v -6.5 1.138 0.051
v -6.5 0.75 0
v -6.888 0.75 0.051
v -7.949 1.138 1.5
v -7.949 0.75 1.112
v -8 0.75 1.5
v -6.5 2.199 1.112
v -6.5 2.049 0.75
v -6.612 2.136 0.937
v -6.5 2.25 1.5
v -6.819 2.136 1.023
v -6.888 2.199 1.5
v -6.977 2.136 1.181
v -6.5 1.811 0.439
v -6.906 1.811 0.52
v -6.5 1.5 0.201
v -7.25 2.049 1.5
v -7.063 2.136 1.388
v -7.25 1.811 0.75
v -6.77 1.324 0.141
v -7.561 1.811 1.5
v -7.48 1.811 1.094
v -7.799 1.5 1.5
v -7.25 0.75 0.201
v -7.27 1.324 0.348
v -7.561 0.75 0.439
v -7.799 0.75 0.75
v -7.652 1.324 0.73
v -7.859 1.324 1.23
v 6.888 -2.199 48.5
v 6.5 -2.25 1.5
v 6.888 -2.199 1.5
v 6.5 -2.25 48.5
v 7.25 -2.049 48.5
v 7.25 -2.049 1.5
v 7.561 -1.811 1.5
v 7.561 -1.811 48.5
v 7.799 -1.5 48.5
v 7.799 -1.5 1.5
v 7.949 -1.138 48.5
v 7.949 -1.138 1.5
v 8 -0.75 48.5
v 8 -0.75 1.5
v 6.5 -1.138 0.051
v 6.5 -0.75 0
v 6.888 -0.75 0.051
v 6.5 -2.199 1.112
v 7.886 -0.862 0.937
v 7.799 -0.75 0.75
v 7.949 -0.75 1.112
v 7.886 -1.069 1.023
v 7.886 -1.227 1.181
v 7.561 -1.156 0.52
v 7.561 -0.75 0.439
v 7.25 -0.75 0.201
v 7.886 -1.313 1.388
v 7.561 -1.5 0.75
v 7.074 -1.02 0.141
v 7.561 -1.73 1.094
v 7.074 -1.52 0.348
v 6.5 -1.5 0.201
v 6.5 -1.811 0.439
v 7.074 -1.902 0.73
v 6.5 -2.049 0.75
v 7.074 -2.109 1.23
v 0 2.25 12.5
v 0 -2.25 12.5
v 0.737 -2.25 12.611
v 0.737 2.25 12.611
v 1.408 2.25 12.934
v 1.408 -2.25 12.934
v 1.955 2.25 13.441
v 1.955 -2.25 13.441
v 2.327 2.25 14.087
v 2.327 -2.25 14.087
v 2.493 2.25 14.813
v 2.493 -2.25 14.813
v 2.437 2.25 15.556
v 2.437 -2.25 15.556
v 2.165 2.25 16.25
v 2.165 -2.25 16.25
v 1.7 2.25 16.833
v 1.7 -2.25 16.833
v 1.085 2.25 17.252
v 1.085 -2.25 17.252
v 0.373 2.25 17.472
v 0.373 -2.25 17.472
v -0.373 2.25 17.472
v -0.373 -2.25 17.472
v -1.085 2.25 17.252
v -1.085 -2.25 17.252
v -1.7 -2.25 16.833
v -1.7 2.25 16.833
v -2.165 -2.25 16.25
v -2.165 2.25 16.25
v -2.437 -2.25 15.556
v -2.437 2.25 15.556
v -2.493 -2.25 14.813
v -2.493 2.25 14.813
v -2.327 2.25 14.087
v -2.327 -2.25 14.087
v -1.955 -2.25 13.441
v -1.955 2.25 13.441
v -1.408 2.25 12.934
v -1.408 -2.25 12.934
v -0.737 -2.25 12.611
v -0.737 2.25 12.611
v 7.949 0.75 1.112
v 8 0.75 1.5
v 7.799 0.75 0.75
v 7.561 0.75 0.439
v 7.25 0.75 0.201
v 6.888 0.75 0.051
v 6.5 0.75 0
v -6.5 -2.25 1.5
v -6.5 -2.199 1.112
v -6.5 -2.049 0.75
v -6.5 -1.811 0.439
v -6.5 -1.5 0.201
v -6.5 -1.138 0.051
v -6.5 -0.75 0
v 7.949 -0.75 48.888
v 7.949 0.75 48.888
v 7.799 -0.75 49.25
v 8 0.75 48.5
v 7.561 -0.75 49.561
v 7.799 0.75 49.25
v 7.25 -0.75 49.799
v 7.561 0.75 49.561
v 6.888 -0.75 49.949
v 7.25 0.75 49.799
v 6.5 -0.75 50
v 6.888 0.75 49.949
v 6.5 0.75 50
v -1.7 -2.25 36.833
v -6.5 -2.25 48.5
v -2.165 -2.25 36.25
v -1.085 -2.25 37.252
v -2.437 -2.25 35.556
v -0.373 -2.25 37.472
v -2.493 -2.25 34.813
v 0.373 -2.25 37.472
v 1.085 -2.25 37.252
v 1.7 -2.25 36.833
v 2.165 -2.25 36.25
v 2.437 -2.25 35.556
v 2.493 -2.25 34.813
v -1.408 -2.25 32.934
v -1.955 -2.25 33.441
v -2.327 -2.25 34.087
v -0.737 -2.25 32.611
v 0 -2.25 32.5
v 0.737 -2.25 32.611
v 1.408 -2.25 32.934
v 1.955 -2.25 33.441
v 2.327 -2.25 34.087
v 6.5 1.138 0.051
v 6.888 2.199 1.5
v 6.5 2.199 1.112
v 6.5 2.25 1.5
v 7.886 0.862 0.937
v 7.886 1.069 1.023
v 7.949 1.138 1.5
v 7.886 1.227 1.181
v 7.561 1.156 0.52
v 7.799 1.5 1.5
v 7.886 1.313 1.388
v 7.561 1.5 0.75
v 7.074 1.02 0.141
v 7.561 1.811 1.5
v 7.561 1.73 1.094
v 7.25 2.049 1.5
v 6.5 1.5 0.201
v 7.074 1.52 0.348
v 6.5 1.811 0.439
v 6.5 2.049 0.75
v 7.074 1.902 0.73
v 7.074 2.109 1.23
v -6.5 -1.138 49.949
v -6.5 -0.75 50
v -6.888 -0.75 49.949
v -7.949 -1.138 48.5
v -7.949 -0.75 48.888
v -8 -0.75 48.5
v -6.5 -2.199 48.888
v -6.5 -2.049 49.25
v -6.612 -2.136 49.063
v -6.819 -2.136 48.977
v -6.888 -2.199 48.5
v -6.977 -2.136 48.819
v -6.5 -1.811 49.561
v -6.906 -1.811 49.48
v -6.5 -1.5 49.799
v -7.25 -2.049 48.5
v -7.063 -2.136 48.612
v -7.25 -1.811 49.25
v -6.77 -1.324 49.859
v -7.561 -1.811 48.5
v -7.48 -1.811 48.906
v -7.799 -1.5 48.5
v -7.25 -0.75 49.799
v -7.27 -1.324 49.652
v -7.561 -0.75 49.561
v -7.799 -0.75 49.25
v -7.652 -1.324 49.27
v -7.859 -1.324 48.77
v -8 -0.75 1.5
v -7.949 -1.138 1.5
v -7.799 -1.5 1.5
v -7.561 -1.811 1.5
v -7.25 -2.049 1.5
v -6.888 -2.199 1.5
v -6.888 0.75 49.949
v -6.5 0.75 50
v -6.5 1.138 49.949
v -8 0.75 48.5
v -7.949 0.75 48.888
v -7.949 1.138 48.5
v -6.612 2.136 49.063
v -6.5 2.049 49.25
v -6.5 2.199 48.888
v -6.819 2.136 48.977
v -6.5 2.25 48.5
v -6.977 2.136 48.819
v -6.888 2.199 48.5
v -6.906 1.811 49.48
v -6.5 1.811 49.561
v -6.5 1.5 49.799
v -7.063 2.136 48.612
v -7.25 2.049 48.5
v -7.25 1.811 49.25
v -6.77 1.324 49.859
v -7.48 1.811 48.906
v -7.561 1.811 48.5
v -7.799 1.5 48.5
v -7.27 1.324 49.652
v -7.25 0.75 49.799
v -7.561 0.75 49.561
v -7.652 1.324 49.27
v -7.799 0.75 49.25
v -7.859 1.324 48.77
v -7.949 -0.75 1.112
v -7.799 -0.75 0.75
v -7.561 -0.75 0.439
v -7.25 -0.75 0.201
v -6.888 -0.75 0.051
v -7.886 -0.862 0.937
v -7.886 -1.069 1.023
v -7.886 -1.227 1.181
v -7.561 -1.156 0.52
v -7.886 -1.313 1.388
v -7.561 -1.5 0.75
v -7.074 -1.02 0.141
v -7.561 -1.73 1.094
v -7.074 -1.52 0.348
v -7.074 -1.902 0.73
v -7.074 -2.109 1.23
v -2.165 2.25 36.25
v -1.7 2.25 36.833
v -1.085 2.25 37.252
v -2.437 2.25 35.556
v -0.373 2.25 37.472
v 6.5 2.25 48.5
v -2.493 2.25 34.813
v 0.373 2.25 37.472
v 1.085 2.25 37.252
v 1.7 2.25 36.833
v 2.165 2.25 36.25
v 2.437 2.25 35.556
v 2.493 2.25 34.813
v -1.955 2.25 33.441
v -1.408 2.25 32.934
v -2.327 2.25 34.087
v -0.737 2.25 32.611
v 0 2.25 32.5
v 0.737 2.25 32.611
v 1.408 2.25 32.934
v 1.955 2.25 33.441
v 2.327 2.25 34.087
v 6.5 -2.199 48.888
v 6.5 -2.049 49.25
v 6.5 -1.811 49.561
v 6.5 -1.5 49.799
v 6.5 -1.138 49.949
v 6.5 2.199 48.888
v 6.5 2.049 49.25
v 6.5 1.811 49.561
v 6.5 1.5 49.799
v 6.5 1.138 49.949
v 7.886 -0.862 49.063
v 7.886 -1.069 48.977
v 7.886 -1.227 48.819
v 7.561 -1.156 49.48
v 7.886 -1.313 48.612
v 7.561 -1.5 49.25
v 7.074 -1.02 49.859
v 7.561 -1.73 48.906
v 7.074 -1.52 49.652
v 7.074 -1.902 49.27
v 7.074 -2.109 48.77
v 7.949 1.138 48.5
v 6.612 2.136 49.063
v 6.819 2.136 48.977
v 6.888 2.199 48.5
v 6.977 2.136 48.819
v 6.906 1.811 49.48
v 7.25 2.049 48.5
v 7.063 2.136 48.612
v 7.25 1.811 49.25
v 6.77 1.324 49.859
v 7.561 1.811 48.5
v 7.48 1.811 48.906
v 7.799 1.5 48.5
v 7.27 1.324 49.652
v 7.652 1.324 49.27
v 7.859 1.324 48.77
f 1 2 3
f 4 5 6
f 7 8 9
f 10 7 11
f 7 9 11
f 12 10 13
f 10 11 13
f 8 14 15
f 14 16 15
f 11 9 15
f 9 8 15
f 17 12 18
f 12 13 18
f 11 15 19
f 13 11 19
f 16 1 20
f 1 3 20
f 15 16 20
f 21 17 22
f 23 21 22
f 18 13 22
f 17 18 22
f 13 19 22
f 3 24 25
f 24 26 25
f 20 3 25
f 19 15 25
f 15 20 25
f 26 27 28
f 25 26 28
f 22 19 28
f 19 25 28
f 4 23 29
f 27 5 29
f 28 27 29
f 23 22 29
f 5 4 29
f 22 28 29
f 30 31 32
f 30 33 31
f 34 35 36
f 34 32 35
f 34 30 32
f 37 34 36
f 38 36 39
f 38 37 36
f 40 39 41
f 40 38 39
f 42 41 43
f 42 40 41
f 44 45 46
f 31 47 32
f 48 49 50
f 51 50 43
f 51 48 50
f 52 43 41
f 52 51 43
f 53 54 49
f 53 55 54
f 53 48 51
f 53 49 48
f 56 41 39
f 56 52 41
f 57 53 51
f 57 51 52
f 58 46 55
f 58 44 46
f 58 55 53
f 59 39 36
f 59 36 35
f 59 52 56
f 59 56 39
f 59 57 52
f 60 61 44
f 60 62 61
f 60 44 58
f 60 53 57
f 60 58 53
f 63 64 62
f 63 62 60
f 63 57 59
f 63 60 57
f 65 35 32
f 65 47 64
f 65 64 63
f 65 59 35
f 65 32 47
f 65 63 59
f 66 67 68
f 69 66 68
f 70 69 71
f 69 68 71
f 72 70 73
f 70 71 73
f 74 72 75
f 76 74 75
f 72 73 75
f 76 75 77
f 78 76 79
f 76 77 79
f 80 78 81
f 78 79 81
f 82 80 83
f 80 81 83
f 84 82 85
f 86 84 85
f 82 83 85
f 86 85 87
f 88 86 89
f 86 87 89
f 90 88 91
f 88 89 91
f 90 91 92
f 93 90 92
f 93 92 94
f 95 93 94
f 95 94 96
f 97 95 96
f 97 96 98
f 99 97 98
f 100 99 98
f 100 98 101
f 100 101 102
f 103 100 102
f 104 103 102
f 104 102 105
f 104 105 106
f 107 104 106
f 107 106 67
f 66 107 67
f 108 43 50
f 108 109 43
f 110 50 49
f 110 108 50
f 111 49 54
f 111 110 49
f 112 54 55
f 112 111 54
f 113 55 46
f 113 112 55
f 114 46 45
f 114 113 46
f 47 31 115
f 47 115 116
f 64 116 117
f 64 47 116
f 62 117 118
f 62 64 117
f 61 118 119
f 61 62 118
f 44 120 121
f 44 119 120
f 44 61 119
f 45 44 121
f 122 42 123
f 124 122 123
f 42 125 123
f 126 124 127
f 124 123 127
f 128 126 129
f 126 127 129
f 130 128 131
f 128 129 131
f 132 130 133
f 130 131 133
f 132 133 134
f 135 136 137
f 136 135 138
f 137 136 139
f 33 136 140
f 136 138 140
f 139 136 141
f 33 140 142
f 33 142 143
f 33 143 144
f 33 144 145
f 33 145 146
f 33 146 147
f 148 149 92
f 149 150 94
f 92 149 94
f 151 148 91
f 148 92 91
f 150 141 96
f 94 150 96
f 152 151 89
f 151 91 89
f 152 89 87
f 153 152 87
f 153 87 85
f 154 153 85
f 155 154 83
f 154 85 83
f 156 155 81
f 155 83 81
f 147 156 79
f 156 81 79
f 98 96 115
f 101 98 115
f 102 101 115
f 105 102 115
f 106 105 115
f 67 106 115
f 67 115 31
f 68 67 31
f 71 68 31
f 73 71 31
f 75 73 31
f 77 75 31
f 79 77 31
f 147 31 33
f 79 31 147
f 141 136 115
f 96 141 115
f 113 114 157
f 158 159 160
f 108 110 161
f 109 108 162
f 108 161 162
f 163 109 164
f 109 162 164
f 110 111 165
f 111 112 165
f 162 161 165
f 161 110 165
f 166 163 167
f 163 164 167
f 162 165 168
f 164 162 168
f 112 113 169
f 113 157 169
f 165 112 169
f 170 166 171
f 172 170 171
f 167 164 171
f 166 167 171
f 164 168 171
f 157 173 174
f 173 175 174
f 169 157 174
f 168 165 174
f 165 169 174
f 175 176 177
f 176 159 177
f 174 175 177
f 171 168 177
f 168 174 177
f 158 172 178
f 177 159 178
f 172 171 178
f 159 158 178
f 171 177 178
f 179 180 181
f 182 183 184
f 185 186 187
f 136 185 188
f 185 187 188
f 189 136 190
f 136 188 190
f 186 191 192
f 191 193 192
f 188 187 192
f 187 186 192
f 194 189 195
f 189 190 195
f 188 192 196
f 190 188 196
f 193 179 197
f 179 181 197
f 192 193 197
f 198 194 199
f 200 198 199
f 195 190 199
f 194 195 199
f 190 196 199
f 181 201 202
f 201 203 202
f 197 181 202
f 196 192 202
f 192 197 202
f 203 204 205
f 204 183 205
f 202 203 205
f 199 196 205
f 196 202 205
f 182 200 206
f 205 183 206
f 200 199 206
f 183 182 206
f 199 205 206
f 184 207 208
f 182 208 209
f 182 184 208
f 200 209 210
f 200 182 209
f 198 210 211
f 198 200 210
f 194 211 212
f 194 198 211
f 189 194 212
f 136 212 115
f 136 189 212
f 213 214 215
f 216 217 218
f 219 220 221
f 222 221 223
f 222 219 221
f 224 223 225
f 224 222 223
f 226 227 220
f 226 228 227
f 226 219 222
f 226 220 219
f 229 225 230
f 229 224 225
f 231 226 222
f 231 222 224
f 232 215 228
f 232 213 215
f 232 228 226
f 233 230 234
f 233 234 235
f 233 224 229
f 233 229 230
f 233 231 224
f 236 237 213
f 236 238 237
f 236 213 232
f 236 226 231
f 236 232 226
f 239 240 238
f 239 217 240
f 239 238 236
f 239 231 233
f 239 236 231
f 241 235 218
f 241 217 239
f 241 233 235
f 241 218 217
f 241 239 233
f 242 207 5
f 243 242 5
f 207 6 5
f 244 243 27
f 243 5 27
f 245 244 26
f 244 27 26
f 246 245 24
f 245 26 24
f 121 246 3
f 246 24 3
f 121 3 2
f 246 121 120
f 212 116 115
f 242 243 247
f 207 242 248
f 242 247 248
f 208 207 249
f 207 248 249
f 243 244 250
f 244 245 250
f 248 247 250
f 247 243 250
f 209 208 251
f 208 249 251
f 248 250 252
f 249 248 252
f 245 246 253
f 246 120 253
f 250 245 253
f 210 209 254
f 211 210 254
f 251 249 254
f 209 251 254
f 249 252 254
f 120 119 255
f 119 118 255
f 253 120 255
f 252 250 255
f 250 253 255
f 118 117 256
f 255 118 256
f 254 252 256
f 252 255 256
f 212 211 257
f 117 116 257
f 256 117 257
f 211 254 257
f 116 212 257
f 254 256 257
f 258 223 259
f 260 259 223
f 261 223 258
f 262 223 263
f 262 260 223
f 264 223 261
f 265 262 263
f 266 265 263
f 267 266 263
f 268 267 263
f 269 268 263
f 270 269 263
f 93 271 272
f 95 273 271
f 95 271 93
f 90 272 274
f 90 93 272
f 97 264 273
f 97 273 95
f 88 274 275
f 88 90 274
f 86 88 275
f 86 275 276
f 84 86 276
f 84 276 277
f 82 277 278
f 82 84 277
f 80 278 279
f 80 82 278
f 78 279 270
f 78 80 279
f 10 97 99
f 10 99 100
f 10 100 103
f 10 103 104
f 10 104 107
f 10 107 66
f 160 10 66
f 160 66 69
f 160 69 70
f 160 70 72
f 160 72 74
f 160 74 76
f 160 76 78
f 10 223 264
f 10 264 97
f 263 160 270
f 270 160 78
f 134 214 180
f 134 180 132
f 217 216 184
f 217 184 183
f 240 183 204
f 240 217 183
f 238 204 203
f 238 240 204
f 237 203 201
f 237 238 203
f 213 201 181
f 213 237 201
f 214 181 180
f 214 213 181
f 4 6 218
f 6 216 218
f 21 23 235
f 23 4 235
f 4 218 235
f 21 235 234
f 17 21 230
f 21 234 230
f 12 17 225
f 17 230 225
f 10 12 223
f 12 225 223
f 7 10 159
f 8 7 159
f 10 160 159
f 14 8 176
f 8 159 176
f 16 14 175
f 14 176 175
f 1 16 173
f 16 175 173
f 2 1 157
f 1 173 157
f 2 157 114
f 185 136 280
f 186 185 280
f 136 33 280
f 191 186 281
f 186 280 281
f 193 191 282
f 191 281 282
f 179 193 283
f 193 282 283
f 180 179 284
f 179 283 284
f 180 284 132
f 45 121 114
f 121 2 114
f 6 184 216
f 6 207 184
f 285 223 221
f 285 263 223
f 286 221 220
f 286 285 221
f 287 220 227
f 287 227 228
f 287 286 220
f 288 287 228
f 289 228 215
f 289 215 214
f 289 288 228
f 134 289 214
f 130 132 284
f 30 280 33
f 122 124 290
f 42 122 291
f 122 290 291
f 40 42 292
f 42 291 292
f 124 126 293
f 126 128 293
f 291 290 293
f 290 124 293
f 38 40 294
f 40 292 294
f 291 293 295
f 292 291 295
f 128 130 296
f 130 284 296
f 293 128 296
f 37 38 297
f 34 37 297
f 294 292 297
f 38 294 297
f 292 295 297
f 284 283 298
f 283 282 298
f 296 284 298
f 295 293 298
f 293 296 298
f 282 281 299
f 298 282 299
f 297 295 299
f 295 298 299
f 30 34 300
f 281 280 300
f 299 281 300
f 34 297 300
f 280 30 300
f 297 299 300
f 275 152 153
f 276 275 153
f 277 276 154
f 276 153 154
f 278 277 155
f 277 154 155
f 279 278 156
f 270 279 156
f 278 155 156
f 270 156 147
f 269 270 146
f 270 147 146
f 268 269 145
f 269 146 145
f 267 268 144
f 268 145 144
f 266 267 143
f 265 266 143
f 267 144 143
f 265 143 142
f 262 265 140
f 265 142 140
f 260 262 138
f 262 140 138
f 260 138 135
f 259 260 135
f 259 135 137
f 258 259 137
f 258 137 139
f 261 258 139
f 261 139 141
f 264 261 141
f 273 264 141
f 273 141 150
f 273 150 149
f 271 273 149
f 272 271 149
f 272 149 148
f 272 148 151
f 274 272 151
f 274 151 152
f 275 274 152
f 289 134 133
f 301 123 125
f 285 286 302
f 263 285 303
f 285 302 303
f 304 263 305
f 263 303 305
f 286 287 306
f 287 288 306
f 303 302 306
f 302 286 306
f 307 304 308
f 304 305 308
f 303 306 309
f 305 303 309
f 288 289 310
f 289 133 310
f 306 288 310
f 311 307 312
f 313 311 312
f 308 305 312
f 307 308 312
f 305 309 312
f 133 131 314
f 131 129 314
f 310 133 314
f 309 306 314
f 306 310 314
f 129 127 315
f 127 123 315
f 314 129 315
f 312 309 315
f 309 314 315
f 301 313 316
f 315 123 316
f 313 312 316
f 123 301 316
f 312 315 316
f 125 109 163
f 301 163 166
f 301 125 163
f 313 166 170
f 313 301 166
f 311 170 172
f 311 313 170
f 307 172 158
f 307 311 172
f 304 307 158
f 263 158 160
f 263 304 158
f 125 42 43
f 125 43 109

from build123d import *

# Parameters (mm, degrees)
SKETCH1_W           = 16
SKETCH1_H           = 4.5
BOSS_EXTRUDE1_DEPTH = 50
FILLET1_R           = 1.5
SKETCH2_R           = 2.5
CUT_EXTRUDE1_DEPTH  = 5


with BuildPart() as part:
    # Sketch1 → Boss-Extrude1 (new body)
    with BuildSketch(Plane.XY):
        Rectangle(SKETCH1_W, SKETCH1_H)
    extrude(amount=BOSS_EXTRUDE1_DEPTH)

    # Fillet1
    fillet1_edges = [part.edges().sort_by_distance(p)[0] for p in [
        (-8, 0, 50),
        (0, -2.25, 50),
        (8, 0, 50),
        (0, -2.25, 0),
        (-8, 0, 0),
        (0, 2.25, 0),
        (8, 0, 0),
        (0, 2.25, 50),
        (8, -2.25, 25),
        (-8, -2.25, 25),
        (-8, 2.25, 25),
        (8, 2.25, 25),
    ]]
    fillet(fillet1_edges, radius=FILLET1_R)

    # Sketch2 → Cut-Extrude1 (cut)
    with BuildSketch(Plane.XZ.offset(2.25)):
        with Locations(Location((0, 15, 0), (0, 0, 270))):
            Circle(SKETCH2_R)
        with Locations(Location((0, 35, 0), (0, 0, 270))):
            Circle(SKETCH2_R)
    extrude(amount=-CUT_EXTRUDE1_DEPTH, mode=Mode.SUBTRACT)


solid = part.part
